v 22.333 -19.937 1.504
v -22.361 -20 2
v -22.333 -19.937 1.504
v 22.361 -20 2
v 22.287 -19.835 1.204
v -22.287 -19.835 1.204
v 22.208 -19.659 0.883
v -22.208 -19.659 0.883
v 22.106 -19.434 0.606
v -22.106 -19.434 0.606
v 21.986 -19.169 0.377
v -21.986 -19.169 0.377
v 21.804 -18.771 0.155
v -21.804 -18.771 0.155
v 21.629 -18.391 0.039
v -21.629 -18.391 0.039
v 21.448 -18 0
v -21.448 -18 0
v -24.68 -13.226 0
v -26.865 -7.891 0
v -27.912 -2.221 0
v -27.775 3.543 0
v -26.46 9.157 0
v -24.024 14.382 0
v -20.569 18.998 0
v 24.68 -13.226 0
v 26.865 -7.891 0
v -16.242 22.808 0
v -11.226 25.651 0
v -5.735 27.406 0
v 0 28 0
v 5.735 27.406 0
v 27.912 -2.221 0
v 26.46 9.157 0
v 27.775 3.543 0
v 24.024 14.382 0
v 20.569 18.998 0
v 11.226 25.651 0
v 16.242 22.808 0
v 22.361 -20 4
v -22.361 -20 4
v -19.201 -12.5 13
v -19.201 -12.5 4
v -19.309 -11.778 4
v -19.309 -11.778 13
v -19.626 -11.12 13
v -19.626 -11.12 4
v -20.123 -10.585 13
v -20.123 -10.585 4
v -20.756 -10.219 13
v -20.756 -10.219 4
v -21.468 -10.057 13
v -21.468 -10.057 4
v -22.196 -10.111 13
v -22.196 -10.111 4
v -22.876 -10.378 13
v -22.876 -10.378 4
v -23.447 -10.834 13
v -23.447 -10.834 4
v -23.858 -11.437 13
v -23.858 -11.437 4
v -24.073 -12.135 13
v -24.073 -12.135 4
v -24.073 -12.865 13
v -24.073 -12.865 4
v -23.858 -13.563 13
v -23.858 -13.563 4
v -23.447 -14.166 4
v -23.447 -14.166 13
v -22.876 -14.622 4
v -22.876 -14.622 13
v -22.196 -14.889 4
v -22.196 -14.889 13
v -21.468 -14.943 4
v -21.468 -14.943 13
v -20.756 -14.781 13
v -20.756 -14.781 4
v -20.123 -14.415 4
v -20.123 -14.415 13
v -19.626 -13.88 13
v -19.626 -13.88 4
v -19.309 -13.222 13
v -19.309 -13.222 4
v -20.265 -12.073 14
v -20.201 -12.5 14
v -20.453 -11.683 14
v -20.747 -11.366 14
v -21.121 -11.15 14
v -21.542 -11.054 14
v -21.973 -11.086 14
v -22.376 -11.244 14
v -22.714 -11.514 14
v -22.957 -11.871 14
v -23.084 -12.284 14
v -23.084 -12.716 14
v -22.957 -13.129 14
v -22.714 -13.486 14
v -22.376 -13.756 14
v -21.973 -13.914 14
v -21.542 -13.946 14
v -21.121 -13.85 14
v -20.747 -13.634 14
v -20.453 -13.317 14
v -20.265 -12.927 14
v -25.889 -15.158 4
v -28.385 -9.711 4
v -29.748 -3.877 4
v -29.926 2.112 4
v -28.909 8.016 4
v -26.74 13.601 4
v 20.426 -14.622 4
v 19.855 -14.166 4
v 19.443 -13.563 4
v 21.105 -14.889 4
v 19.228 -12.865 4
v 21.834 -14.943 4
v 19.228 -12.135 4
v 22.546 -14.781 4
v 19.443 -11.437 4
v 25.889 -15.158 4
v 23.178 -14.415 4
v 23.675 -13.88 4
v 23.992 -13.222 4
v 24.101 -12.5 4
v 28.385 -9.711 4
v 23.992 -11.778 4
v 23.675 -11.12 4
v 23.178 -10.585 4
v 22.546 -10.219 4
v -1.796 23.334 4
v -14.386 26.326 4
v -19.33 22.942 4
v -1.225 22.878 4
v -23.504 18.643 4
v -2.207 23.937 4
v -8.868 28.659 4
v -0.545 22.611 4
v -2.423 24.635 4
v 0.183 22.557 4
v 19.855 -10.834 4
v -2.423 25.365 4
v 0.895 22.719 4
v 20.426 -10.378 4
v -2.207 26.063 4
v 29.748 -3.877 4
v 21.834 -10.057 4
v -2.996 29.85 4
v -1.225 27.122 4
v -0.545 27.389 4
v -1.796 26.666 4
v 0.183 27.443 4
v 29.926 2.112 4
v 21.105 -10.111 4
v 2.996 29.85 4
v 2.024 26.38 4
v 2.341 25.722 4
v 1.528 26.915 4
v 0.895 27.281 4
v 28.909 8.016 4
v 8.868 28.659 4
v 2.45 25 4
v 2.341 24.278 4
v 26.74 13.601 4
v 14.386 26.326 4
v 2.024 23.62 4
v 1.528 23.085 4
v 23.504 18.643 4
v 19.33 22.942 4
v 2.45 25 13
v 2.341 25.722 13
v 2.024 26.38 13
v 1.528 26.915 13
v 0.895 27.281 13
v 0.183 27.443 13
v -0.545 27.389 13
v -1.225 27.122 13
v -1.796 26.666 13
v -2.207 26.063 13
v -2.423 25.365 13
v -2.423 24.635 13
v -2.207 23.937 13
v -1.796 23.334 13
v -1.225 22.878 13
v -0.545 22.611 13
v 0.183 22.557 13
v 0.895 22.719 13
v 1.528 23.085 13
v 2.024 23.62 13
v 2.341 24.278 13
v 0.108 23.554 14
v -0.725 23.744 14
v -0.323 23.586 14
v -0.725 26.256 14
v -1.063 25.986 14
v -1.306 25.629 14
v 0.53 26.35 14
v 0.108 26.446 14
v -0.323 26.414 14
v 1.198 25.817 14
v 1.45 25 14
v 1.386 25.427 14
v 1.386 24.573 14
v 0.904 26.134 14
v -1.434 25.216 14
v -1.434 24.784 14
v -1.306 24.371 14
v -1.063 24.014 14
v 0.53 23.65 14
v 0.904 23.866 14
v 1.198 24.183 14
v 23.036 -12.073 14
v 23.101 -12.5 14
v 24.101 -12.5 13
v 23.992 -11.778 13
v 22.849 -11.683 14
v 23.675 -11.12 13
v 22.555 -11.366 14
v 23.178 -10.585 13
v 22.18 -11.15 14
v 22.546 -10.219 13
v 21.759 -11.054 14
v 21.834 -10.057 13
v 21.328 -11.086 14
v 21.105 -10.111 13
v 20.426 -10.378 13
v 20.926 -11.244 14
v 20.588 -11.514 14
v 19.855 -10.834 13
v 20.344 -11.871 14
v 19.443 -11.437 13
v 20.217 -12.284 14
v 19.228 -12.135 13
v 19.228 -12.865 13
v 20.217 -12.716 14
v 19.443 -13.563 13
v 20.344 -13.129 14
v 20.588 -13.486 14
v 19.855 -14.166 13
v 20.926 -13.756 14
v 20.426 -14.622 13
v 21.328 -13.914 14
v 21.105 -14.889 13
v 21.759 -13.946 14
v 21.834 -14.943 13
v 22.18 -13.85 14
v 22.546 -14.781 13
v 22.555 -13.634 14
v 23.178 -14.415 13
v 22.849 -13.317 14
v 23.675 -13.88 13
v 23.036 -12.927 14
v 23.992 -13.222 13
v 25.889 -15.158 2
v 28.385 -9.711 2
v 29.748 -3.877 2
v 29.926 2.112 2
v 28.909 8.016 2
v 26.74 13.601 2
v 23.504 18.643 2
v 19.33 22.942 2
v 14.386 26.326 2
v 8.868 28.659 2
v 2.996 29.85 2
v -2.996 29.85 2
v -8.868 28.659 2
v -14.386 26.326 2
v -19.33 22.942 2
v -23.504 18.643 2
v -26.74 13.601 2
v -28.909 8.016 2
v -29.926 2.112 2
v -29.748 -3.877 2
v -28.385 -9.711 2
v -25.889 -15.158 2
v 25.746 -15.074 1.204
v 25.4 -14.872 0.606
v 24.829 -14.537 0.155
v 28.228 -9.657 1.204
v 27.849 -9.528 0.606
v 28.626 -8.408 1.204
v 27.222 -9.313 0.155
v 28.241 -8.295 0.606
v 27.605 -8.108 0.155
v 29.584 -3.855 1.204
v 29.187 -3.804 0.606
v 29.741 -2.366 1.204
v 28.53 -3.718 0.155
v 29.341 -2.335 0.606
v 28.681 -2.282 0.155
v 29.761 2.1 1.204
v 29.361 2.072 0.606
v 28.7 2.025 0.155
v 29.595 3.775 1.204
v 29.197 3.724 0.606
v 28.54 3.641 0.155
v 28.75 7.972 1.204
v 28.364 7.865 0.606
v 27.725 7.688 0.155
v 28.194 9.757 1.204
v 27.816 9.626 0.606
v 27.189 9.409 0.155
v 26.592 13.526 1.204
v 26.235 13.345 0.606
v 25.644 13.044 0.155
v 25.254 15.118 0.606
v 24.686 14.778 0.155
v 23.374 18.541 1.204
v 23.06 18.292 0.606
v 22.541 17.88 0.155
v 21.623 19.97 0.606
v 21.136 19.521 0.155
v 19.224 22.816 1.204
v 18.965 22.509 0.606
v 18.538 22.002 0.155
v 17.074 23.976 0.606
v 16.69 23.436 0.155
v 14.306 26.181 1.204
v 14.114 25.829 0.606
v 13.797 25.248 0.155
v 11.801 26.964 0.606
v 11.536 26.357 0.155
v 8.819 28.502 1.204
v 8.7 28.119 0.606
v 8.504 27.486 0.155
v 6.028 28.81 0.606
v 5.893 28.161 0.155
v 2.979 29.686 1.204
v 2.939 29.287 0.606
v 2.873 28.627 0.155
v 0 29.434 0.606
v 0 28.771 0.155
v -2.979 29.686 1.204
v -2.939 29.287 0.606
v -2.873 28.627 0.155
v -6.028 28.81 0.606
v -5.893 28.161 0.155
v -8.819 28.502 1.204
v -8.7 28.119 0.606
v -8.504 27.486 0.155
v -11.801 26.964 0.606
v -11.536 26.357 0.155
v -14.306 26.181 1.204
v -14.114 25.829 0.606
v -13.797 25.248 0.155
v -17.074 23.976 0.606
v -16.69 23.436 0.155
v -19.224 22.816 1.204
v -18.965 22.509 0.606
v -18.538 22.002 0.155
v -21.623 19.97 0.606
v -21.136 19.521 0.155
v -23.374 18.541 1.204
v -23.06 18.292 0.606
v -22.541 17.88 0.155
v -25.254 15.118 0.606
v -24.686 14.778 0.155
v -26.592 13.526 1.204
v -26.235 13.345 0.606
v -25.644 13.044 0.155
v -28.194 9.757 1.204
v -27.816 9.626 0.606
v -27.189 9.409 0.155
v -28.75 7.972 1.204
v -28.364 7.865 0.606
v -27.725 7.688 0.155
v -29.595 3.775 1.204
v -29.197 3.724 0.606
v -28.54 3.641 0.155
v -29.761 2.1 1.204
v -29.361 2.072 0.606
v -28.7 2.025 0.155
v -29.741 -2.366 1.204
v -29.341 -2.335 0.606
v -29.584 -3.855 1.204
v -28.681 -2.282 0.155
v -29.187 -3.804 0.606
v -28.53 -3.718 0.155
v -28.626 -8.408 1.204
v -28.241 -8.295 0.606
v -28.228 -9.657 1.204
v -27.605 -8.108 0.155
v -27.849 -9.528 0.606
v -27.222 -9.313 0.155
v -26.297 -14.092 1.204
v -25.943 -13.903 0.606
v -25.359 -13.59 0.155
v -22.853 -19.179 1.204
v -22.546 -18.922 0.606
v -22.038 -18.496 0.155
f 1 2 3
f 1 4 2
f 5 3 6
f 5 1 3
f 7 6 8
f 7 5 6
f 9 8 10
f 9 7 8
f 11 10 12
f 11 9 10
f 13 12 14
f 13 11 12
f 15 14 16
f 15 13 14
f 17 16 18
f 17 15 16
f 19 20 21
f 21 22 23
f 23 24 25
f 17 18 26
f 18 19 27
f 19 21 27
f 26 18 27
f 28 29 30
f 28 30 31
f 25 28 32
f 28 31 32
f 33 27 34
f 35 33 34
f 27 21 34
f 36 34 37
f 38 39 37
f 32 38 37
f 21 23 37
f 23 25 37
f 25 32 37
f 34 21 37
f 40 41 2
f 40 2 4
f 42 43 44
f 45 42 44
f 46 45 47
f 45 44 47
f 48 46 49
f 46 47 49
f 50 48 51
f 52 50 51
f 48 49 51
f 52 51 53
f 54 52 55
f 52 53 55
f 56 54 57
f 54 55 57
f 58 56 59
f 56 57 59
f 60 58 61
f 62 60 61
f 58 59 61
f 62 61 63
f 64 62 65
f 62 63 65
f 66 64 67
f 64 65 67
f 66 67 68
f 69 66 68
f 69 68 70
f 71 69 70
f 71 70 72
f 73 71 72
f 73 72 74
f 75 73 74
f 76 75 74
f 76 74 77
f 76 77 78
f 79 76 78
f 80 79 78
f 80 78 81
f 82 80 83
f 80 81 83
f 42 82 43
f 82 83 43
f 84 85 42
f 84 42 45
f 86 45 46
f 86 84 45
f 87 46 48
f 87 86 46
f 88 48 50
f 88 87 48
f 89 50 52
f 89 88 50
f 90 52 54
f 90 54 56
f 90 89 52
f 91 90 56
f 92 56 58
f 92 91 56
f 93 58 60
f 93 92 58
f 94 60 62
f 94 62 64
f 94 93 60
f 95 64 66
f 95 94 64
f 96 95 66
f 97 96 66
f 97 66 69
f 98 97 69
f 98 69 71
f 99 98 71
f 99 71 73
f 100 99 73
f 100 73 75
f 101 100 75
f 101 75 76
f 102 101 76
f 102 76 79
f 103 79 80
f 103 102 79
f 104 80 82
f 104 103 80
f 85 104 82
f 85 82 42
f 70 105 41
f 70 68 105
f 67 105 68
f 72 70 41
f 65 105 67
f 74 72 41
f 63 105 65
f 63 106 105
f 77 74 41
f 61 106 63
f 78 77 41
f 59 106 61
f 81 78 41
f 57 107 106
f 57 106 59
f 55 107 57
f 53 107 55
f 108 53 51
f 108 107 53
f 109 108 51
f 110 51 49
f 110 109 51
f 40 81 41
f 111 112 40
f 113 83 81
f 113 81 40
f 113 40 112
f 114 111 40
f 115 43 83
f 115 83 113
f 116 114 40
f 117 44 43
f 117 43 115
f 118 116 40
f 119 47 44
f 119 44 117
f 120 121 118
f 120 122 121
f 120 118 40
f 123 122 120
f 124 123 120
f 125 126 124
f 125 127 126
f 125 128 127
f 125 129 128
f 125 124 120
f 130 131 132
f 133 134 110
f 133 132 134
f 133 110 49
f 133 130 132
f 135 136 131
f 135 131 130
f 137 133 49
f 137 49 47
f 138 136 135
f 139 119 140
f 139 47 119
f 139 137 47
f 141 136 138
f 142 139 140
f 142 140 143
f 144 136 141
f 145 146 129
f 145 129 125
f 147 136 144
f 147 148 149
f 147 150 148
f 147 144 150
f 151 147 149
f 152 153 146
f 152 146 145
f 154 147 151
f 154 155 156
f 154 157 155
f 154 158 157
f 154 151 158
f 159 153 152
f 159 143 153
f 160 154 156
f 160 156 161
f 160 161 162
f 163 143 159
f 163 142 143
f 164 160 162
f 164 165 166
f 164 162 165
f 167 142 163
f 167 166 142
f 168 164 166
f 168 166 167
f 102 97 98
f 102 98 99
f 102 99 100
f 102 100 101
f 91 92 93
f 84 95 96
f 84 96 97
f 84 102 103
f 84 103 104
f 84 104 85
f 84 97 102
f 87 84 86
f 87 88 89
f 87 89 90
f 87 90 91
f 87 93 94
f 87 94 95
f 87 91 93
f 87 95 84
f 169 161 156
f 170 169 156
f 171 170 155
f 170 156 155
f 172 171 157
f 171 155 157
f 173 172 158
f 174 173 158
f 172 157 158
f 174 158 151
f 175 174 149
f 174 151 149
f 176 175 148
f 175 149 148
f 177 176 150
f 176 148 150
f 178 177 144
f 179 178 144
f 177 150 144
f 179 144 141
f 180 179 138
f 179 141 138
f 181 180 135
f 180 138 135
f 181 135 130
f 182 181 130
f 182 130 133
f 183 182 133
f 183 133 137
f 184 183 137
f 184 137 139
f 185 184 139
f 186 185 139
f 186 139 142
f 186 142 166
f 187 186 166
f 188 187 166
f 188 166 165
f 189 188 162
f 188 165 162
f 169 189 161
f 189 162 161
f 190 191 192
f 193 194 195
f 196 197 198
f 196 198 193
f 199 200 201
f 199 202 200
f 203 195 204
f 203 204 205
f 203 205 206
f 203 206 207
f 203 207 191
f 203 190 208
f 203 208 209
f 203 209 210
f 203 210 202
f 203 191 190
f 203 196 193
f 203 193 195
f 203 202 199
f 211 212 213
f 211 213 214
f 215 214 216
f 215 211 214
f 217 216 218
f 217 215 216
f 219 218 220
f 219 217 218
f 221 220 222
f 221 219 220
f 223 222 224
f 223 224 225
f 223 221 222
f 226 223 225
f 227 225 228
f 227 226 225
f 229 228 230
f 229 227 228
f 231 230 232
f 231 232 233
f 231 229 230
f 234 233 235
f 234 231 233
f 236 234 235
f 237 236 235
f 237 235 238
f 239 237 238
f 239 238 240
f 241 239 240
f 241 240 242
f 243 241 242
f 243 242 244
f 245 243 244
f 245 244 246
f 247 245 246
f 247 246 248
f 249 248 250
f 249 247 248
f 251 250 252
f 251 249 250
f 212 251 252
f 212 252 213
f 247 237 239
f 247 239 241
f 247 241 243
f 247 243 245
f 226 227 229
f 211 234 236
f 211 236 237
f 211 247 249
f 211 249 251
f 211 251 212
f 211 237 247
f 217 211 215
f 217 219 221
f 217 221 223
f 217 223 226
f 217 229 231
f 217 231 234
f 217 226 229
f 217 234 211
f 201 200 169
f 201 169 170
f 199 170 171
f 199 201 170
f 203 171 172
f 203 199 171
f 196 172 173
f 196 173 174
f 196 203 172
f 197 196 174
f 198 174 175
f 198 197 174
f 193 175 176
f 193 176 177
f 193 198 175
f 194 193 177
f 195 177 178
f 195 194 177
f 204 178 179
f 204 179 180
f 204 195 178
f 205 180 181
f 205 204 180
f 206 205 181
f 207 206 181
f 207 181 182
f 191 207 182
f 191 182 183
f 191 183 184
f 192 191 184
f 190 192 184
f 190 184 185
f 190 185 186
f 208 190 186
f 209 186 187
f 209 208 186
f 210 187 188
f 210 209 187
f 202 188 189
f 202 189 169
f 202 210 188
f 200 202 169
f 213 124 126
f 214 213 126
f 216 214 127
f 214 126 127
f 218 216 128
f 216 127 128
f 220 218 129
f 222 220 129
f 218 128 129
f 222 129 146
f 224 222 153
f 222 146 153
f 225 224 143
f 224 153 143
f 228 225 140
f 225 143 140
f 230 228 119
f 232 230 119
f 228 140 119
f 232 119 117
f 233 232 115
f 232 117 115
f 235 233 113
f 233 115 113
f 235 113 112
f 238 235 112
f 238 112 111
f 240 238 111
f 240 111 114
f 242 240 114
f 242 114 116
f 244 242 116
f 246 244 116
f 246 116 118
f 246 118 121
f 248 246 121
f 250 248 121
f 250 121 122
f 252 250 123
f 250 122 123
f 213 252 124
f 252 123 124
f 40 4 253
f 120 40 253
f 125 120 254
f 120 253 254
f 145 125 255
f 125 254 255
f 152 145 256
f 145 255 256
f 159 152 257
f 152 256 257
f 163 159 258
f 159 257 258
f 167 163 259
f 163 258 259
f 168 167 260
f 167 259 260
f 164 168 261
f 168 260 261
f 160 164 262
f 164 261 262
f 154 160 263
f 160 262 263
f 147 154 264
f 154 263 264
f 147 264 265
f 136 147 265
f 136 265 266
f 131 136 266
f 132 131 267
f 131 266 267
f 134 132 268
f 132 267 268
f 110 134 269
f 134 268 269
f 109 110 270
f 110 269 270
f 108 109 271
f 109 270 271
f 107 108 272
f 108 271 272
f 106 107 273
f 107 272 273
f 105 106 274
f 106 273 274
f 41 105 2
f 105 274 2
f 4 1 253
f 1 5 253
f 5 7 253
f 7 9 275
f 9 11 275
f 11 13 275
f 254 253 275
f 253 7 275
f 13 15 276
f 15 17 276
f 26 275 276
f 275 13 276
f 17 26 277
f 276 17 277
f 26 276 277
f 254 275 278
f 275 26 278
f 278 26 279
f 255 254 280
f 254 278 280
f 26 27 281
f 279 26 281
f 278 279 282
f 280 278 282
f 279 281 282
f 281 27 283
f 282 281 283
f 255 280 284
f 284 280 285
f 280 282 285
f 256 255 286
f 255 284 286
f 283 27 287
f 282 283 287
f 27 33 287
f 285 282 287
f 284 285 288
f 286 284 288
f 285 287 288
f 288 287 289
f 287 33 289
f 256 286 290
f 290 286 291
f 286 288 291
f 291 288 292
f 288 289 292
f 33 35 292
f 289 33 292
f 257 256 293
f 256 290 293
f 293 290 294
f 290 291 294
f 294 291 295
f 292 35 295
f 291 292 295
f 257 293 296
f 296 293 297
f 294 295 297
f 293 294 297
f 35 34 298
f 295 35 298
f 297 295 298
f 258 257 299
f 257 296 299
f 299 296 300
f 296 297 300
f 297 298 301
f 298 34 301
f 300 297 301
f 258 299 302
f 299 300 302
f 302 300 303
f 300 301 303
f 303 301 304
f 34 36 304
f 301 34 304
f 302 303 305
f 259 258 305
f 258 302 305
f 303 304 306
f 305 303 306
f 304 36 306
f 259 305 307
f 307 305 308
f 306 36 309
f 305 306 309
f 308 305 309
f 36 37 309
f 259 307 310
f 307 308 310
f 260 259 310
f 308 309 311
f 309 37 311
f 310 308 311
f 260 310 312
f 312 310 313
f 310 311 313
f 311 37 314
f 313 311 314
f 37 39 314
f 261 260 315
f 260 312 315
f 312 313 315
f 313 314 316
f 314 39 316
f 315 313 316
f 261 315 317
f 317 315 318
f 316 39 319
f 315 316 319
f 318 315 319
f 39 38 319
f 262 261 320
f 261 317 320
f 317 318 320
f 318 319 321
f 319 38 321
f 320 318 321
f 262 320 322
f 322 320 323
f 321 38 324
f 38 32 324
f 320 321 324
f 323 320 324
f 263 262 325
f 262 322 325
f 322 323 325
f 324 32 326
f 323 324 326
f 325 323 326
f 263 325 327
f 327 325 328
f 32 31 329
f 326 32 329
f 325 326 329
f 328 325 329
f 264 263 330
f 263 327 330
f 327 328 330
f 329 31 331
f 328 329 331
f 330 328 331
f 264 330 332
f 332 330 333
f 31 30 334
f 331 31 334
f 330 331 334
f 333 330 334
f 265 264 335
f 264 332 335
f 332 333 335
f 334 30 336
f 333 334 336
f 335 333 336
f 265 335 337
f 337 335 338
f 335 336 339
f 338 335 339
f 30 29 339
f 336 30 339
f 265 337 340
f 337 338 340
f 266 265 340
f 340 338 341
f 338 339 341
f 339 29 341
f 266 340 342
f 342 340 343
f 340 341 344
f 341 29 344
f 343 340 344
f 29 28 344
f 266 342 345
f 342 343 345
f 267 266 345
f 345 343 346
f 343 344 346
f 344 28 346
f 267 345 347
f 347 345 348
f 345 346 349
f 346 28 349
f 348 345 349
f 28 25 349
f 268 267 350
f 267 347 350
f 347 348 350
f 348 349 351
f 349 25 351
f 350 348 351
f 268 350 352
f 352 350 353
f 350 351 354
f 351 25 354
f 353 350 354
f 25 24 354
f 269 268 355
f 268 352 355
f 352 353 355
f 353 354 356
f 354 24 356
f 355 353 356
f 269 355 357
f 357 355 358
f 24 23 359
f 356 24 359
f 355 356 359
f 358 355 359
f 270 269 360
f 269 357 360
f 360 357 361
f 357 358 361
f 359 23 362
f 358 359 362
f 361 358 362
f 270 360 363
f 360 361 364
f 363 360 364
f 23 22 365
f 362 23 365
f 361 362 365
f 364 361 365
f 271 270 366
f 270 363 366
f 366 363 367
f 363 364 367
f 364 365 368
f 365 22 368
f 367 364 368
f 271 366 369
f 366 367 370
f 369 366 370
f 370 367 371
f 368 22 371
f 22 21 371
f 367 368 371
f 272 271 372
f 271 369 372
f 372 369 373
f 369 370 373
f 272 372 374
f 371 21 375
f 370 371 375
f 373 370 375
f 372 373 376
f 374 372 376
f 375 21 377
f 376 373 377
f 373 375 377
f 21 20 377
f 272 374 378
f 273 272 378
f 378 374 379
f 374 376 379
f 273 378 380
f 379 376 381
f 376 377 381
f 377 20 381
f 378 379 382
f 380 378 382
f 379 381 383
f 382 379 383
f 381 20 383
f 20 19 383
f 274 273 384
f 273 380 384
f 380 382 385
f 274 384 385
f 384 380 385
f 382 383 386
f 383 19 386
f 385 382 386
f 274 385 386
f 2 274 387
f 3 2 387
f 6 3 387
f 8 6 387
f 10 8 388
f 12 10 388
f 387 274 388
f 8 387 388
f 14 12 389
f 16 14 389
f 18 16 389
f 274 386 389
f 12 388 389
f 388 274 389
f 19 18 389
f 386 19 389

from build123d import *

# Parameters (mm, degrees)
SKETCH_1_R               = 30
EXTRUDE_1_DEPTH          = 4
SKETCH_2_R               = 2.45
EXTRUDE_2_DEPTH          = 10
CUT_EXTRUDE_1_DEPTH      = 45.676615807
CUT_EXTRUDE_1_DEPTH_BACK = 45.676615807
FILLET_1_R               = 2
CHAMFER_1_SIZE           = 1


with BuildPart() as part:
    # 스케치1 → 보스-돌출1 (new body)
    with BuildSketch(Plane.XY):
        Circle(SKETCH_1_R)
    extrude(amount=EXTRUDE_1_DEPTH)

    # 스케치2 → 보스-돌출2 (add)
    with BuildSketch(Plane.XY.offset(4)):
        with Locations((0, 25)):
            Circle(SKETCH_2_R)
        with Locations((21.650635095, -12.5)):
            Circle(SKETCH_2_R)
        with Locations((-21.650635095, -12.5)):
            Circle(SKETCH_2_R)
    extrude(amount=EXTRUDE_2_DEPTH)

    # 스케치3 → 컷-돌출1 (cut, two sides: drawn at the far end of the back side and taken through both)
    with BuildSketch(Plane(origin=(0, 0, 0), x_dir=(-1, 0, 0), z_dir=(0, 0, -1)).offset(-CUT_EXTRUDE_1_DEPTH_BACK)):
        with BuildLine():
            Line((22.360679775, -20), (-22.360679775, -20))
            ThreePointArc((-22.360679775, -20), (0, -30), (22.360679775, -20))
        make_face()
    extrude(amount=CUT_EXTRUDE_1_DEPTH + CUT_EXTRUDE_1_DEPTH_BACK, mode=Mode.SUBTRACT)

    # 필렛1
    fillet_1_edges = [part.edges().sort_by_distance(p)[0] for p in [
        (0, 30, 0),
        (0, -20, 0),
    ]]
    fillet(fillet_1_edges, radius=FILLET_1_R)

    # 모따기1
    chamfer_1_edges = [part.edges().sort_by_distance(p)[0] for p in [
        (-24.100635095, -12.5, 14),
        (-2.45, 25, 14),
        (19.200635095, -12.5, 14),
    ]]
    chamfer(chamfer_1_edges, length=CHAMFER_1_SIZE)


solid = part.part
